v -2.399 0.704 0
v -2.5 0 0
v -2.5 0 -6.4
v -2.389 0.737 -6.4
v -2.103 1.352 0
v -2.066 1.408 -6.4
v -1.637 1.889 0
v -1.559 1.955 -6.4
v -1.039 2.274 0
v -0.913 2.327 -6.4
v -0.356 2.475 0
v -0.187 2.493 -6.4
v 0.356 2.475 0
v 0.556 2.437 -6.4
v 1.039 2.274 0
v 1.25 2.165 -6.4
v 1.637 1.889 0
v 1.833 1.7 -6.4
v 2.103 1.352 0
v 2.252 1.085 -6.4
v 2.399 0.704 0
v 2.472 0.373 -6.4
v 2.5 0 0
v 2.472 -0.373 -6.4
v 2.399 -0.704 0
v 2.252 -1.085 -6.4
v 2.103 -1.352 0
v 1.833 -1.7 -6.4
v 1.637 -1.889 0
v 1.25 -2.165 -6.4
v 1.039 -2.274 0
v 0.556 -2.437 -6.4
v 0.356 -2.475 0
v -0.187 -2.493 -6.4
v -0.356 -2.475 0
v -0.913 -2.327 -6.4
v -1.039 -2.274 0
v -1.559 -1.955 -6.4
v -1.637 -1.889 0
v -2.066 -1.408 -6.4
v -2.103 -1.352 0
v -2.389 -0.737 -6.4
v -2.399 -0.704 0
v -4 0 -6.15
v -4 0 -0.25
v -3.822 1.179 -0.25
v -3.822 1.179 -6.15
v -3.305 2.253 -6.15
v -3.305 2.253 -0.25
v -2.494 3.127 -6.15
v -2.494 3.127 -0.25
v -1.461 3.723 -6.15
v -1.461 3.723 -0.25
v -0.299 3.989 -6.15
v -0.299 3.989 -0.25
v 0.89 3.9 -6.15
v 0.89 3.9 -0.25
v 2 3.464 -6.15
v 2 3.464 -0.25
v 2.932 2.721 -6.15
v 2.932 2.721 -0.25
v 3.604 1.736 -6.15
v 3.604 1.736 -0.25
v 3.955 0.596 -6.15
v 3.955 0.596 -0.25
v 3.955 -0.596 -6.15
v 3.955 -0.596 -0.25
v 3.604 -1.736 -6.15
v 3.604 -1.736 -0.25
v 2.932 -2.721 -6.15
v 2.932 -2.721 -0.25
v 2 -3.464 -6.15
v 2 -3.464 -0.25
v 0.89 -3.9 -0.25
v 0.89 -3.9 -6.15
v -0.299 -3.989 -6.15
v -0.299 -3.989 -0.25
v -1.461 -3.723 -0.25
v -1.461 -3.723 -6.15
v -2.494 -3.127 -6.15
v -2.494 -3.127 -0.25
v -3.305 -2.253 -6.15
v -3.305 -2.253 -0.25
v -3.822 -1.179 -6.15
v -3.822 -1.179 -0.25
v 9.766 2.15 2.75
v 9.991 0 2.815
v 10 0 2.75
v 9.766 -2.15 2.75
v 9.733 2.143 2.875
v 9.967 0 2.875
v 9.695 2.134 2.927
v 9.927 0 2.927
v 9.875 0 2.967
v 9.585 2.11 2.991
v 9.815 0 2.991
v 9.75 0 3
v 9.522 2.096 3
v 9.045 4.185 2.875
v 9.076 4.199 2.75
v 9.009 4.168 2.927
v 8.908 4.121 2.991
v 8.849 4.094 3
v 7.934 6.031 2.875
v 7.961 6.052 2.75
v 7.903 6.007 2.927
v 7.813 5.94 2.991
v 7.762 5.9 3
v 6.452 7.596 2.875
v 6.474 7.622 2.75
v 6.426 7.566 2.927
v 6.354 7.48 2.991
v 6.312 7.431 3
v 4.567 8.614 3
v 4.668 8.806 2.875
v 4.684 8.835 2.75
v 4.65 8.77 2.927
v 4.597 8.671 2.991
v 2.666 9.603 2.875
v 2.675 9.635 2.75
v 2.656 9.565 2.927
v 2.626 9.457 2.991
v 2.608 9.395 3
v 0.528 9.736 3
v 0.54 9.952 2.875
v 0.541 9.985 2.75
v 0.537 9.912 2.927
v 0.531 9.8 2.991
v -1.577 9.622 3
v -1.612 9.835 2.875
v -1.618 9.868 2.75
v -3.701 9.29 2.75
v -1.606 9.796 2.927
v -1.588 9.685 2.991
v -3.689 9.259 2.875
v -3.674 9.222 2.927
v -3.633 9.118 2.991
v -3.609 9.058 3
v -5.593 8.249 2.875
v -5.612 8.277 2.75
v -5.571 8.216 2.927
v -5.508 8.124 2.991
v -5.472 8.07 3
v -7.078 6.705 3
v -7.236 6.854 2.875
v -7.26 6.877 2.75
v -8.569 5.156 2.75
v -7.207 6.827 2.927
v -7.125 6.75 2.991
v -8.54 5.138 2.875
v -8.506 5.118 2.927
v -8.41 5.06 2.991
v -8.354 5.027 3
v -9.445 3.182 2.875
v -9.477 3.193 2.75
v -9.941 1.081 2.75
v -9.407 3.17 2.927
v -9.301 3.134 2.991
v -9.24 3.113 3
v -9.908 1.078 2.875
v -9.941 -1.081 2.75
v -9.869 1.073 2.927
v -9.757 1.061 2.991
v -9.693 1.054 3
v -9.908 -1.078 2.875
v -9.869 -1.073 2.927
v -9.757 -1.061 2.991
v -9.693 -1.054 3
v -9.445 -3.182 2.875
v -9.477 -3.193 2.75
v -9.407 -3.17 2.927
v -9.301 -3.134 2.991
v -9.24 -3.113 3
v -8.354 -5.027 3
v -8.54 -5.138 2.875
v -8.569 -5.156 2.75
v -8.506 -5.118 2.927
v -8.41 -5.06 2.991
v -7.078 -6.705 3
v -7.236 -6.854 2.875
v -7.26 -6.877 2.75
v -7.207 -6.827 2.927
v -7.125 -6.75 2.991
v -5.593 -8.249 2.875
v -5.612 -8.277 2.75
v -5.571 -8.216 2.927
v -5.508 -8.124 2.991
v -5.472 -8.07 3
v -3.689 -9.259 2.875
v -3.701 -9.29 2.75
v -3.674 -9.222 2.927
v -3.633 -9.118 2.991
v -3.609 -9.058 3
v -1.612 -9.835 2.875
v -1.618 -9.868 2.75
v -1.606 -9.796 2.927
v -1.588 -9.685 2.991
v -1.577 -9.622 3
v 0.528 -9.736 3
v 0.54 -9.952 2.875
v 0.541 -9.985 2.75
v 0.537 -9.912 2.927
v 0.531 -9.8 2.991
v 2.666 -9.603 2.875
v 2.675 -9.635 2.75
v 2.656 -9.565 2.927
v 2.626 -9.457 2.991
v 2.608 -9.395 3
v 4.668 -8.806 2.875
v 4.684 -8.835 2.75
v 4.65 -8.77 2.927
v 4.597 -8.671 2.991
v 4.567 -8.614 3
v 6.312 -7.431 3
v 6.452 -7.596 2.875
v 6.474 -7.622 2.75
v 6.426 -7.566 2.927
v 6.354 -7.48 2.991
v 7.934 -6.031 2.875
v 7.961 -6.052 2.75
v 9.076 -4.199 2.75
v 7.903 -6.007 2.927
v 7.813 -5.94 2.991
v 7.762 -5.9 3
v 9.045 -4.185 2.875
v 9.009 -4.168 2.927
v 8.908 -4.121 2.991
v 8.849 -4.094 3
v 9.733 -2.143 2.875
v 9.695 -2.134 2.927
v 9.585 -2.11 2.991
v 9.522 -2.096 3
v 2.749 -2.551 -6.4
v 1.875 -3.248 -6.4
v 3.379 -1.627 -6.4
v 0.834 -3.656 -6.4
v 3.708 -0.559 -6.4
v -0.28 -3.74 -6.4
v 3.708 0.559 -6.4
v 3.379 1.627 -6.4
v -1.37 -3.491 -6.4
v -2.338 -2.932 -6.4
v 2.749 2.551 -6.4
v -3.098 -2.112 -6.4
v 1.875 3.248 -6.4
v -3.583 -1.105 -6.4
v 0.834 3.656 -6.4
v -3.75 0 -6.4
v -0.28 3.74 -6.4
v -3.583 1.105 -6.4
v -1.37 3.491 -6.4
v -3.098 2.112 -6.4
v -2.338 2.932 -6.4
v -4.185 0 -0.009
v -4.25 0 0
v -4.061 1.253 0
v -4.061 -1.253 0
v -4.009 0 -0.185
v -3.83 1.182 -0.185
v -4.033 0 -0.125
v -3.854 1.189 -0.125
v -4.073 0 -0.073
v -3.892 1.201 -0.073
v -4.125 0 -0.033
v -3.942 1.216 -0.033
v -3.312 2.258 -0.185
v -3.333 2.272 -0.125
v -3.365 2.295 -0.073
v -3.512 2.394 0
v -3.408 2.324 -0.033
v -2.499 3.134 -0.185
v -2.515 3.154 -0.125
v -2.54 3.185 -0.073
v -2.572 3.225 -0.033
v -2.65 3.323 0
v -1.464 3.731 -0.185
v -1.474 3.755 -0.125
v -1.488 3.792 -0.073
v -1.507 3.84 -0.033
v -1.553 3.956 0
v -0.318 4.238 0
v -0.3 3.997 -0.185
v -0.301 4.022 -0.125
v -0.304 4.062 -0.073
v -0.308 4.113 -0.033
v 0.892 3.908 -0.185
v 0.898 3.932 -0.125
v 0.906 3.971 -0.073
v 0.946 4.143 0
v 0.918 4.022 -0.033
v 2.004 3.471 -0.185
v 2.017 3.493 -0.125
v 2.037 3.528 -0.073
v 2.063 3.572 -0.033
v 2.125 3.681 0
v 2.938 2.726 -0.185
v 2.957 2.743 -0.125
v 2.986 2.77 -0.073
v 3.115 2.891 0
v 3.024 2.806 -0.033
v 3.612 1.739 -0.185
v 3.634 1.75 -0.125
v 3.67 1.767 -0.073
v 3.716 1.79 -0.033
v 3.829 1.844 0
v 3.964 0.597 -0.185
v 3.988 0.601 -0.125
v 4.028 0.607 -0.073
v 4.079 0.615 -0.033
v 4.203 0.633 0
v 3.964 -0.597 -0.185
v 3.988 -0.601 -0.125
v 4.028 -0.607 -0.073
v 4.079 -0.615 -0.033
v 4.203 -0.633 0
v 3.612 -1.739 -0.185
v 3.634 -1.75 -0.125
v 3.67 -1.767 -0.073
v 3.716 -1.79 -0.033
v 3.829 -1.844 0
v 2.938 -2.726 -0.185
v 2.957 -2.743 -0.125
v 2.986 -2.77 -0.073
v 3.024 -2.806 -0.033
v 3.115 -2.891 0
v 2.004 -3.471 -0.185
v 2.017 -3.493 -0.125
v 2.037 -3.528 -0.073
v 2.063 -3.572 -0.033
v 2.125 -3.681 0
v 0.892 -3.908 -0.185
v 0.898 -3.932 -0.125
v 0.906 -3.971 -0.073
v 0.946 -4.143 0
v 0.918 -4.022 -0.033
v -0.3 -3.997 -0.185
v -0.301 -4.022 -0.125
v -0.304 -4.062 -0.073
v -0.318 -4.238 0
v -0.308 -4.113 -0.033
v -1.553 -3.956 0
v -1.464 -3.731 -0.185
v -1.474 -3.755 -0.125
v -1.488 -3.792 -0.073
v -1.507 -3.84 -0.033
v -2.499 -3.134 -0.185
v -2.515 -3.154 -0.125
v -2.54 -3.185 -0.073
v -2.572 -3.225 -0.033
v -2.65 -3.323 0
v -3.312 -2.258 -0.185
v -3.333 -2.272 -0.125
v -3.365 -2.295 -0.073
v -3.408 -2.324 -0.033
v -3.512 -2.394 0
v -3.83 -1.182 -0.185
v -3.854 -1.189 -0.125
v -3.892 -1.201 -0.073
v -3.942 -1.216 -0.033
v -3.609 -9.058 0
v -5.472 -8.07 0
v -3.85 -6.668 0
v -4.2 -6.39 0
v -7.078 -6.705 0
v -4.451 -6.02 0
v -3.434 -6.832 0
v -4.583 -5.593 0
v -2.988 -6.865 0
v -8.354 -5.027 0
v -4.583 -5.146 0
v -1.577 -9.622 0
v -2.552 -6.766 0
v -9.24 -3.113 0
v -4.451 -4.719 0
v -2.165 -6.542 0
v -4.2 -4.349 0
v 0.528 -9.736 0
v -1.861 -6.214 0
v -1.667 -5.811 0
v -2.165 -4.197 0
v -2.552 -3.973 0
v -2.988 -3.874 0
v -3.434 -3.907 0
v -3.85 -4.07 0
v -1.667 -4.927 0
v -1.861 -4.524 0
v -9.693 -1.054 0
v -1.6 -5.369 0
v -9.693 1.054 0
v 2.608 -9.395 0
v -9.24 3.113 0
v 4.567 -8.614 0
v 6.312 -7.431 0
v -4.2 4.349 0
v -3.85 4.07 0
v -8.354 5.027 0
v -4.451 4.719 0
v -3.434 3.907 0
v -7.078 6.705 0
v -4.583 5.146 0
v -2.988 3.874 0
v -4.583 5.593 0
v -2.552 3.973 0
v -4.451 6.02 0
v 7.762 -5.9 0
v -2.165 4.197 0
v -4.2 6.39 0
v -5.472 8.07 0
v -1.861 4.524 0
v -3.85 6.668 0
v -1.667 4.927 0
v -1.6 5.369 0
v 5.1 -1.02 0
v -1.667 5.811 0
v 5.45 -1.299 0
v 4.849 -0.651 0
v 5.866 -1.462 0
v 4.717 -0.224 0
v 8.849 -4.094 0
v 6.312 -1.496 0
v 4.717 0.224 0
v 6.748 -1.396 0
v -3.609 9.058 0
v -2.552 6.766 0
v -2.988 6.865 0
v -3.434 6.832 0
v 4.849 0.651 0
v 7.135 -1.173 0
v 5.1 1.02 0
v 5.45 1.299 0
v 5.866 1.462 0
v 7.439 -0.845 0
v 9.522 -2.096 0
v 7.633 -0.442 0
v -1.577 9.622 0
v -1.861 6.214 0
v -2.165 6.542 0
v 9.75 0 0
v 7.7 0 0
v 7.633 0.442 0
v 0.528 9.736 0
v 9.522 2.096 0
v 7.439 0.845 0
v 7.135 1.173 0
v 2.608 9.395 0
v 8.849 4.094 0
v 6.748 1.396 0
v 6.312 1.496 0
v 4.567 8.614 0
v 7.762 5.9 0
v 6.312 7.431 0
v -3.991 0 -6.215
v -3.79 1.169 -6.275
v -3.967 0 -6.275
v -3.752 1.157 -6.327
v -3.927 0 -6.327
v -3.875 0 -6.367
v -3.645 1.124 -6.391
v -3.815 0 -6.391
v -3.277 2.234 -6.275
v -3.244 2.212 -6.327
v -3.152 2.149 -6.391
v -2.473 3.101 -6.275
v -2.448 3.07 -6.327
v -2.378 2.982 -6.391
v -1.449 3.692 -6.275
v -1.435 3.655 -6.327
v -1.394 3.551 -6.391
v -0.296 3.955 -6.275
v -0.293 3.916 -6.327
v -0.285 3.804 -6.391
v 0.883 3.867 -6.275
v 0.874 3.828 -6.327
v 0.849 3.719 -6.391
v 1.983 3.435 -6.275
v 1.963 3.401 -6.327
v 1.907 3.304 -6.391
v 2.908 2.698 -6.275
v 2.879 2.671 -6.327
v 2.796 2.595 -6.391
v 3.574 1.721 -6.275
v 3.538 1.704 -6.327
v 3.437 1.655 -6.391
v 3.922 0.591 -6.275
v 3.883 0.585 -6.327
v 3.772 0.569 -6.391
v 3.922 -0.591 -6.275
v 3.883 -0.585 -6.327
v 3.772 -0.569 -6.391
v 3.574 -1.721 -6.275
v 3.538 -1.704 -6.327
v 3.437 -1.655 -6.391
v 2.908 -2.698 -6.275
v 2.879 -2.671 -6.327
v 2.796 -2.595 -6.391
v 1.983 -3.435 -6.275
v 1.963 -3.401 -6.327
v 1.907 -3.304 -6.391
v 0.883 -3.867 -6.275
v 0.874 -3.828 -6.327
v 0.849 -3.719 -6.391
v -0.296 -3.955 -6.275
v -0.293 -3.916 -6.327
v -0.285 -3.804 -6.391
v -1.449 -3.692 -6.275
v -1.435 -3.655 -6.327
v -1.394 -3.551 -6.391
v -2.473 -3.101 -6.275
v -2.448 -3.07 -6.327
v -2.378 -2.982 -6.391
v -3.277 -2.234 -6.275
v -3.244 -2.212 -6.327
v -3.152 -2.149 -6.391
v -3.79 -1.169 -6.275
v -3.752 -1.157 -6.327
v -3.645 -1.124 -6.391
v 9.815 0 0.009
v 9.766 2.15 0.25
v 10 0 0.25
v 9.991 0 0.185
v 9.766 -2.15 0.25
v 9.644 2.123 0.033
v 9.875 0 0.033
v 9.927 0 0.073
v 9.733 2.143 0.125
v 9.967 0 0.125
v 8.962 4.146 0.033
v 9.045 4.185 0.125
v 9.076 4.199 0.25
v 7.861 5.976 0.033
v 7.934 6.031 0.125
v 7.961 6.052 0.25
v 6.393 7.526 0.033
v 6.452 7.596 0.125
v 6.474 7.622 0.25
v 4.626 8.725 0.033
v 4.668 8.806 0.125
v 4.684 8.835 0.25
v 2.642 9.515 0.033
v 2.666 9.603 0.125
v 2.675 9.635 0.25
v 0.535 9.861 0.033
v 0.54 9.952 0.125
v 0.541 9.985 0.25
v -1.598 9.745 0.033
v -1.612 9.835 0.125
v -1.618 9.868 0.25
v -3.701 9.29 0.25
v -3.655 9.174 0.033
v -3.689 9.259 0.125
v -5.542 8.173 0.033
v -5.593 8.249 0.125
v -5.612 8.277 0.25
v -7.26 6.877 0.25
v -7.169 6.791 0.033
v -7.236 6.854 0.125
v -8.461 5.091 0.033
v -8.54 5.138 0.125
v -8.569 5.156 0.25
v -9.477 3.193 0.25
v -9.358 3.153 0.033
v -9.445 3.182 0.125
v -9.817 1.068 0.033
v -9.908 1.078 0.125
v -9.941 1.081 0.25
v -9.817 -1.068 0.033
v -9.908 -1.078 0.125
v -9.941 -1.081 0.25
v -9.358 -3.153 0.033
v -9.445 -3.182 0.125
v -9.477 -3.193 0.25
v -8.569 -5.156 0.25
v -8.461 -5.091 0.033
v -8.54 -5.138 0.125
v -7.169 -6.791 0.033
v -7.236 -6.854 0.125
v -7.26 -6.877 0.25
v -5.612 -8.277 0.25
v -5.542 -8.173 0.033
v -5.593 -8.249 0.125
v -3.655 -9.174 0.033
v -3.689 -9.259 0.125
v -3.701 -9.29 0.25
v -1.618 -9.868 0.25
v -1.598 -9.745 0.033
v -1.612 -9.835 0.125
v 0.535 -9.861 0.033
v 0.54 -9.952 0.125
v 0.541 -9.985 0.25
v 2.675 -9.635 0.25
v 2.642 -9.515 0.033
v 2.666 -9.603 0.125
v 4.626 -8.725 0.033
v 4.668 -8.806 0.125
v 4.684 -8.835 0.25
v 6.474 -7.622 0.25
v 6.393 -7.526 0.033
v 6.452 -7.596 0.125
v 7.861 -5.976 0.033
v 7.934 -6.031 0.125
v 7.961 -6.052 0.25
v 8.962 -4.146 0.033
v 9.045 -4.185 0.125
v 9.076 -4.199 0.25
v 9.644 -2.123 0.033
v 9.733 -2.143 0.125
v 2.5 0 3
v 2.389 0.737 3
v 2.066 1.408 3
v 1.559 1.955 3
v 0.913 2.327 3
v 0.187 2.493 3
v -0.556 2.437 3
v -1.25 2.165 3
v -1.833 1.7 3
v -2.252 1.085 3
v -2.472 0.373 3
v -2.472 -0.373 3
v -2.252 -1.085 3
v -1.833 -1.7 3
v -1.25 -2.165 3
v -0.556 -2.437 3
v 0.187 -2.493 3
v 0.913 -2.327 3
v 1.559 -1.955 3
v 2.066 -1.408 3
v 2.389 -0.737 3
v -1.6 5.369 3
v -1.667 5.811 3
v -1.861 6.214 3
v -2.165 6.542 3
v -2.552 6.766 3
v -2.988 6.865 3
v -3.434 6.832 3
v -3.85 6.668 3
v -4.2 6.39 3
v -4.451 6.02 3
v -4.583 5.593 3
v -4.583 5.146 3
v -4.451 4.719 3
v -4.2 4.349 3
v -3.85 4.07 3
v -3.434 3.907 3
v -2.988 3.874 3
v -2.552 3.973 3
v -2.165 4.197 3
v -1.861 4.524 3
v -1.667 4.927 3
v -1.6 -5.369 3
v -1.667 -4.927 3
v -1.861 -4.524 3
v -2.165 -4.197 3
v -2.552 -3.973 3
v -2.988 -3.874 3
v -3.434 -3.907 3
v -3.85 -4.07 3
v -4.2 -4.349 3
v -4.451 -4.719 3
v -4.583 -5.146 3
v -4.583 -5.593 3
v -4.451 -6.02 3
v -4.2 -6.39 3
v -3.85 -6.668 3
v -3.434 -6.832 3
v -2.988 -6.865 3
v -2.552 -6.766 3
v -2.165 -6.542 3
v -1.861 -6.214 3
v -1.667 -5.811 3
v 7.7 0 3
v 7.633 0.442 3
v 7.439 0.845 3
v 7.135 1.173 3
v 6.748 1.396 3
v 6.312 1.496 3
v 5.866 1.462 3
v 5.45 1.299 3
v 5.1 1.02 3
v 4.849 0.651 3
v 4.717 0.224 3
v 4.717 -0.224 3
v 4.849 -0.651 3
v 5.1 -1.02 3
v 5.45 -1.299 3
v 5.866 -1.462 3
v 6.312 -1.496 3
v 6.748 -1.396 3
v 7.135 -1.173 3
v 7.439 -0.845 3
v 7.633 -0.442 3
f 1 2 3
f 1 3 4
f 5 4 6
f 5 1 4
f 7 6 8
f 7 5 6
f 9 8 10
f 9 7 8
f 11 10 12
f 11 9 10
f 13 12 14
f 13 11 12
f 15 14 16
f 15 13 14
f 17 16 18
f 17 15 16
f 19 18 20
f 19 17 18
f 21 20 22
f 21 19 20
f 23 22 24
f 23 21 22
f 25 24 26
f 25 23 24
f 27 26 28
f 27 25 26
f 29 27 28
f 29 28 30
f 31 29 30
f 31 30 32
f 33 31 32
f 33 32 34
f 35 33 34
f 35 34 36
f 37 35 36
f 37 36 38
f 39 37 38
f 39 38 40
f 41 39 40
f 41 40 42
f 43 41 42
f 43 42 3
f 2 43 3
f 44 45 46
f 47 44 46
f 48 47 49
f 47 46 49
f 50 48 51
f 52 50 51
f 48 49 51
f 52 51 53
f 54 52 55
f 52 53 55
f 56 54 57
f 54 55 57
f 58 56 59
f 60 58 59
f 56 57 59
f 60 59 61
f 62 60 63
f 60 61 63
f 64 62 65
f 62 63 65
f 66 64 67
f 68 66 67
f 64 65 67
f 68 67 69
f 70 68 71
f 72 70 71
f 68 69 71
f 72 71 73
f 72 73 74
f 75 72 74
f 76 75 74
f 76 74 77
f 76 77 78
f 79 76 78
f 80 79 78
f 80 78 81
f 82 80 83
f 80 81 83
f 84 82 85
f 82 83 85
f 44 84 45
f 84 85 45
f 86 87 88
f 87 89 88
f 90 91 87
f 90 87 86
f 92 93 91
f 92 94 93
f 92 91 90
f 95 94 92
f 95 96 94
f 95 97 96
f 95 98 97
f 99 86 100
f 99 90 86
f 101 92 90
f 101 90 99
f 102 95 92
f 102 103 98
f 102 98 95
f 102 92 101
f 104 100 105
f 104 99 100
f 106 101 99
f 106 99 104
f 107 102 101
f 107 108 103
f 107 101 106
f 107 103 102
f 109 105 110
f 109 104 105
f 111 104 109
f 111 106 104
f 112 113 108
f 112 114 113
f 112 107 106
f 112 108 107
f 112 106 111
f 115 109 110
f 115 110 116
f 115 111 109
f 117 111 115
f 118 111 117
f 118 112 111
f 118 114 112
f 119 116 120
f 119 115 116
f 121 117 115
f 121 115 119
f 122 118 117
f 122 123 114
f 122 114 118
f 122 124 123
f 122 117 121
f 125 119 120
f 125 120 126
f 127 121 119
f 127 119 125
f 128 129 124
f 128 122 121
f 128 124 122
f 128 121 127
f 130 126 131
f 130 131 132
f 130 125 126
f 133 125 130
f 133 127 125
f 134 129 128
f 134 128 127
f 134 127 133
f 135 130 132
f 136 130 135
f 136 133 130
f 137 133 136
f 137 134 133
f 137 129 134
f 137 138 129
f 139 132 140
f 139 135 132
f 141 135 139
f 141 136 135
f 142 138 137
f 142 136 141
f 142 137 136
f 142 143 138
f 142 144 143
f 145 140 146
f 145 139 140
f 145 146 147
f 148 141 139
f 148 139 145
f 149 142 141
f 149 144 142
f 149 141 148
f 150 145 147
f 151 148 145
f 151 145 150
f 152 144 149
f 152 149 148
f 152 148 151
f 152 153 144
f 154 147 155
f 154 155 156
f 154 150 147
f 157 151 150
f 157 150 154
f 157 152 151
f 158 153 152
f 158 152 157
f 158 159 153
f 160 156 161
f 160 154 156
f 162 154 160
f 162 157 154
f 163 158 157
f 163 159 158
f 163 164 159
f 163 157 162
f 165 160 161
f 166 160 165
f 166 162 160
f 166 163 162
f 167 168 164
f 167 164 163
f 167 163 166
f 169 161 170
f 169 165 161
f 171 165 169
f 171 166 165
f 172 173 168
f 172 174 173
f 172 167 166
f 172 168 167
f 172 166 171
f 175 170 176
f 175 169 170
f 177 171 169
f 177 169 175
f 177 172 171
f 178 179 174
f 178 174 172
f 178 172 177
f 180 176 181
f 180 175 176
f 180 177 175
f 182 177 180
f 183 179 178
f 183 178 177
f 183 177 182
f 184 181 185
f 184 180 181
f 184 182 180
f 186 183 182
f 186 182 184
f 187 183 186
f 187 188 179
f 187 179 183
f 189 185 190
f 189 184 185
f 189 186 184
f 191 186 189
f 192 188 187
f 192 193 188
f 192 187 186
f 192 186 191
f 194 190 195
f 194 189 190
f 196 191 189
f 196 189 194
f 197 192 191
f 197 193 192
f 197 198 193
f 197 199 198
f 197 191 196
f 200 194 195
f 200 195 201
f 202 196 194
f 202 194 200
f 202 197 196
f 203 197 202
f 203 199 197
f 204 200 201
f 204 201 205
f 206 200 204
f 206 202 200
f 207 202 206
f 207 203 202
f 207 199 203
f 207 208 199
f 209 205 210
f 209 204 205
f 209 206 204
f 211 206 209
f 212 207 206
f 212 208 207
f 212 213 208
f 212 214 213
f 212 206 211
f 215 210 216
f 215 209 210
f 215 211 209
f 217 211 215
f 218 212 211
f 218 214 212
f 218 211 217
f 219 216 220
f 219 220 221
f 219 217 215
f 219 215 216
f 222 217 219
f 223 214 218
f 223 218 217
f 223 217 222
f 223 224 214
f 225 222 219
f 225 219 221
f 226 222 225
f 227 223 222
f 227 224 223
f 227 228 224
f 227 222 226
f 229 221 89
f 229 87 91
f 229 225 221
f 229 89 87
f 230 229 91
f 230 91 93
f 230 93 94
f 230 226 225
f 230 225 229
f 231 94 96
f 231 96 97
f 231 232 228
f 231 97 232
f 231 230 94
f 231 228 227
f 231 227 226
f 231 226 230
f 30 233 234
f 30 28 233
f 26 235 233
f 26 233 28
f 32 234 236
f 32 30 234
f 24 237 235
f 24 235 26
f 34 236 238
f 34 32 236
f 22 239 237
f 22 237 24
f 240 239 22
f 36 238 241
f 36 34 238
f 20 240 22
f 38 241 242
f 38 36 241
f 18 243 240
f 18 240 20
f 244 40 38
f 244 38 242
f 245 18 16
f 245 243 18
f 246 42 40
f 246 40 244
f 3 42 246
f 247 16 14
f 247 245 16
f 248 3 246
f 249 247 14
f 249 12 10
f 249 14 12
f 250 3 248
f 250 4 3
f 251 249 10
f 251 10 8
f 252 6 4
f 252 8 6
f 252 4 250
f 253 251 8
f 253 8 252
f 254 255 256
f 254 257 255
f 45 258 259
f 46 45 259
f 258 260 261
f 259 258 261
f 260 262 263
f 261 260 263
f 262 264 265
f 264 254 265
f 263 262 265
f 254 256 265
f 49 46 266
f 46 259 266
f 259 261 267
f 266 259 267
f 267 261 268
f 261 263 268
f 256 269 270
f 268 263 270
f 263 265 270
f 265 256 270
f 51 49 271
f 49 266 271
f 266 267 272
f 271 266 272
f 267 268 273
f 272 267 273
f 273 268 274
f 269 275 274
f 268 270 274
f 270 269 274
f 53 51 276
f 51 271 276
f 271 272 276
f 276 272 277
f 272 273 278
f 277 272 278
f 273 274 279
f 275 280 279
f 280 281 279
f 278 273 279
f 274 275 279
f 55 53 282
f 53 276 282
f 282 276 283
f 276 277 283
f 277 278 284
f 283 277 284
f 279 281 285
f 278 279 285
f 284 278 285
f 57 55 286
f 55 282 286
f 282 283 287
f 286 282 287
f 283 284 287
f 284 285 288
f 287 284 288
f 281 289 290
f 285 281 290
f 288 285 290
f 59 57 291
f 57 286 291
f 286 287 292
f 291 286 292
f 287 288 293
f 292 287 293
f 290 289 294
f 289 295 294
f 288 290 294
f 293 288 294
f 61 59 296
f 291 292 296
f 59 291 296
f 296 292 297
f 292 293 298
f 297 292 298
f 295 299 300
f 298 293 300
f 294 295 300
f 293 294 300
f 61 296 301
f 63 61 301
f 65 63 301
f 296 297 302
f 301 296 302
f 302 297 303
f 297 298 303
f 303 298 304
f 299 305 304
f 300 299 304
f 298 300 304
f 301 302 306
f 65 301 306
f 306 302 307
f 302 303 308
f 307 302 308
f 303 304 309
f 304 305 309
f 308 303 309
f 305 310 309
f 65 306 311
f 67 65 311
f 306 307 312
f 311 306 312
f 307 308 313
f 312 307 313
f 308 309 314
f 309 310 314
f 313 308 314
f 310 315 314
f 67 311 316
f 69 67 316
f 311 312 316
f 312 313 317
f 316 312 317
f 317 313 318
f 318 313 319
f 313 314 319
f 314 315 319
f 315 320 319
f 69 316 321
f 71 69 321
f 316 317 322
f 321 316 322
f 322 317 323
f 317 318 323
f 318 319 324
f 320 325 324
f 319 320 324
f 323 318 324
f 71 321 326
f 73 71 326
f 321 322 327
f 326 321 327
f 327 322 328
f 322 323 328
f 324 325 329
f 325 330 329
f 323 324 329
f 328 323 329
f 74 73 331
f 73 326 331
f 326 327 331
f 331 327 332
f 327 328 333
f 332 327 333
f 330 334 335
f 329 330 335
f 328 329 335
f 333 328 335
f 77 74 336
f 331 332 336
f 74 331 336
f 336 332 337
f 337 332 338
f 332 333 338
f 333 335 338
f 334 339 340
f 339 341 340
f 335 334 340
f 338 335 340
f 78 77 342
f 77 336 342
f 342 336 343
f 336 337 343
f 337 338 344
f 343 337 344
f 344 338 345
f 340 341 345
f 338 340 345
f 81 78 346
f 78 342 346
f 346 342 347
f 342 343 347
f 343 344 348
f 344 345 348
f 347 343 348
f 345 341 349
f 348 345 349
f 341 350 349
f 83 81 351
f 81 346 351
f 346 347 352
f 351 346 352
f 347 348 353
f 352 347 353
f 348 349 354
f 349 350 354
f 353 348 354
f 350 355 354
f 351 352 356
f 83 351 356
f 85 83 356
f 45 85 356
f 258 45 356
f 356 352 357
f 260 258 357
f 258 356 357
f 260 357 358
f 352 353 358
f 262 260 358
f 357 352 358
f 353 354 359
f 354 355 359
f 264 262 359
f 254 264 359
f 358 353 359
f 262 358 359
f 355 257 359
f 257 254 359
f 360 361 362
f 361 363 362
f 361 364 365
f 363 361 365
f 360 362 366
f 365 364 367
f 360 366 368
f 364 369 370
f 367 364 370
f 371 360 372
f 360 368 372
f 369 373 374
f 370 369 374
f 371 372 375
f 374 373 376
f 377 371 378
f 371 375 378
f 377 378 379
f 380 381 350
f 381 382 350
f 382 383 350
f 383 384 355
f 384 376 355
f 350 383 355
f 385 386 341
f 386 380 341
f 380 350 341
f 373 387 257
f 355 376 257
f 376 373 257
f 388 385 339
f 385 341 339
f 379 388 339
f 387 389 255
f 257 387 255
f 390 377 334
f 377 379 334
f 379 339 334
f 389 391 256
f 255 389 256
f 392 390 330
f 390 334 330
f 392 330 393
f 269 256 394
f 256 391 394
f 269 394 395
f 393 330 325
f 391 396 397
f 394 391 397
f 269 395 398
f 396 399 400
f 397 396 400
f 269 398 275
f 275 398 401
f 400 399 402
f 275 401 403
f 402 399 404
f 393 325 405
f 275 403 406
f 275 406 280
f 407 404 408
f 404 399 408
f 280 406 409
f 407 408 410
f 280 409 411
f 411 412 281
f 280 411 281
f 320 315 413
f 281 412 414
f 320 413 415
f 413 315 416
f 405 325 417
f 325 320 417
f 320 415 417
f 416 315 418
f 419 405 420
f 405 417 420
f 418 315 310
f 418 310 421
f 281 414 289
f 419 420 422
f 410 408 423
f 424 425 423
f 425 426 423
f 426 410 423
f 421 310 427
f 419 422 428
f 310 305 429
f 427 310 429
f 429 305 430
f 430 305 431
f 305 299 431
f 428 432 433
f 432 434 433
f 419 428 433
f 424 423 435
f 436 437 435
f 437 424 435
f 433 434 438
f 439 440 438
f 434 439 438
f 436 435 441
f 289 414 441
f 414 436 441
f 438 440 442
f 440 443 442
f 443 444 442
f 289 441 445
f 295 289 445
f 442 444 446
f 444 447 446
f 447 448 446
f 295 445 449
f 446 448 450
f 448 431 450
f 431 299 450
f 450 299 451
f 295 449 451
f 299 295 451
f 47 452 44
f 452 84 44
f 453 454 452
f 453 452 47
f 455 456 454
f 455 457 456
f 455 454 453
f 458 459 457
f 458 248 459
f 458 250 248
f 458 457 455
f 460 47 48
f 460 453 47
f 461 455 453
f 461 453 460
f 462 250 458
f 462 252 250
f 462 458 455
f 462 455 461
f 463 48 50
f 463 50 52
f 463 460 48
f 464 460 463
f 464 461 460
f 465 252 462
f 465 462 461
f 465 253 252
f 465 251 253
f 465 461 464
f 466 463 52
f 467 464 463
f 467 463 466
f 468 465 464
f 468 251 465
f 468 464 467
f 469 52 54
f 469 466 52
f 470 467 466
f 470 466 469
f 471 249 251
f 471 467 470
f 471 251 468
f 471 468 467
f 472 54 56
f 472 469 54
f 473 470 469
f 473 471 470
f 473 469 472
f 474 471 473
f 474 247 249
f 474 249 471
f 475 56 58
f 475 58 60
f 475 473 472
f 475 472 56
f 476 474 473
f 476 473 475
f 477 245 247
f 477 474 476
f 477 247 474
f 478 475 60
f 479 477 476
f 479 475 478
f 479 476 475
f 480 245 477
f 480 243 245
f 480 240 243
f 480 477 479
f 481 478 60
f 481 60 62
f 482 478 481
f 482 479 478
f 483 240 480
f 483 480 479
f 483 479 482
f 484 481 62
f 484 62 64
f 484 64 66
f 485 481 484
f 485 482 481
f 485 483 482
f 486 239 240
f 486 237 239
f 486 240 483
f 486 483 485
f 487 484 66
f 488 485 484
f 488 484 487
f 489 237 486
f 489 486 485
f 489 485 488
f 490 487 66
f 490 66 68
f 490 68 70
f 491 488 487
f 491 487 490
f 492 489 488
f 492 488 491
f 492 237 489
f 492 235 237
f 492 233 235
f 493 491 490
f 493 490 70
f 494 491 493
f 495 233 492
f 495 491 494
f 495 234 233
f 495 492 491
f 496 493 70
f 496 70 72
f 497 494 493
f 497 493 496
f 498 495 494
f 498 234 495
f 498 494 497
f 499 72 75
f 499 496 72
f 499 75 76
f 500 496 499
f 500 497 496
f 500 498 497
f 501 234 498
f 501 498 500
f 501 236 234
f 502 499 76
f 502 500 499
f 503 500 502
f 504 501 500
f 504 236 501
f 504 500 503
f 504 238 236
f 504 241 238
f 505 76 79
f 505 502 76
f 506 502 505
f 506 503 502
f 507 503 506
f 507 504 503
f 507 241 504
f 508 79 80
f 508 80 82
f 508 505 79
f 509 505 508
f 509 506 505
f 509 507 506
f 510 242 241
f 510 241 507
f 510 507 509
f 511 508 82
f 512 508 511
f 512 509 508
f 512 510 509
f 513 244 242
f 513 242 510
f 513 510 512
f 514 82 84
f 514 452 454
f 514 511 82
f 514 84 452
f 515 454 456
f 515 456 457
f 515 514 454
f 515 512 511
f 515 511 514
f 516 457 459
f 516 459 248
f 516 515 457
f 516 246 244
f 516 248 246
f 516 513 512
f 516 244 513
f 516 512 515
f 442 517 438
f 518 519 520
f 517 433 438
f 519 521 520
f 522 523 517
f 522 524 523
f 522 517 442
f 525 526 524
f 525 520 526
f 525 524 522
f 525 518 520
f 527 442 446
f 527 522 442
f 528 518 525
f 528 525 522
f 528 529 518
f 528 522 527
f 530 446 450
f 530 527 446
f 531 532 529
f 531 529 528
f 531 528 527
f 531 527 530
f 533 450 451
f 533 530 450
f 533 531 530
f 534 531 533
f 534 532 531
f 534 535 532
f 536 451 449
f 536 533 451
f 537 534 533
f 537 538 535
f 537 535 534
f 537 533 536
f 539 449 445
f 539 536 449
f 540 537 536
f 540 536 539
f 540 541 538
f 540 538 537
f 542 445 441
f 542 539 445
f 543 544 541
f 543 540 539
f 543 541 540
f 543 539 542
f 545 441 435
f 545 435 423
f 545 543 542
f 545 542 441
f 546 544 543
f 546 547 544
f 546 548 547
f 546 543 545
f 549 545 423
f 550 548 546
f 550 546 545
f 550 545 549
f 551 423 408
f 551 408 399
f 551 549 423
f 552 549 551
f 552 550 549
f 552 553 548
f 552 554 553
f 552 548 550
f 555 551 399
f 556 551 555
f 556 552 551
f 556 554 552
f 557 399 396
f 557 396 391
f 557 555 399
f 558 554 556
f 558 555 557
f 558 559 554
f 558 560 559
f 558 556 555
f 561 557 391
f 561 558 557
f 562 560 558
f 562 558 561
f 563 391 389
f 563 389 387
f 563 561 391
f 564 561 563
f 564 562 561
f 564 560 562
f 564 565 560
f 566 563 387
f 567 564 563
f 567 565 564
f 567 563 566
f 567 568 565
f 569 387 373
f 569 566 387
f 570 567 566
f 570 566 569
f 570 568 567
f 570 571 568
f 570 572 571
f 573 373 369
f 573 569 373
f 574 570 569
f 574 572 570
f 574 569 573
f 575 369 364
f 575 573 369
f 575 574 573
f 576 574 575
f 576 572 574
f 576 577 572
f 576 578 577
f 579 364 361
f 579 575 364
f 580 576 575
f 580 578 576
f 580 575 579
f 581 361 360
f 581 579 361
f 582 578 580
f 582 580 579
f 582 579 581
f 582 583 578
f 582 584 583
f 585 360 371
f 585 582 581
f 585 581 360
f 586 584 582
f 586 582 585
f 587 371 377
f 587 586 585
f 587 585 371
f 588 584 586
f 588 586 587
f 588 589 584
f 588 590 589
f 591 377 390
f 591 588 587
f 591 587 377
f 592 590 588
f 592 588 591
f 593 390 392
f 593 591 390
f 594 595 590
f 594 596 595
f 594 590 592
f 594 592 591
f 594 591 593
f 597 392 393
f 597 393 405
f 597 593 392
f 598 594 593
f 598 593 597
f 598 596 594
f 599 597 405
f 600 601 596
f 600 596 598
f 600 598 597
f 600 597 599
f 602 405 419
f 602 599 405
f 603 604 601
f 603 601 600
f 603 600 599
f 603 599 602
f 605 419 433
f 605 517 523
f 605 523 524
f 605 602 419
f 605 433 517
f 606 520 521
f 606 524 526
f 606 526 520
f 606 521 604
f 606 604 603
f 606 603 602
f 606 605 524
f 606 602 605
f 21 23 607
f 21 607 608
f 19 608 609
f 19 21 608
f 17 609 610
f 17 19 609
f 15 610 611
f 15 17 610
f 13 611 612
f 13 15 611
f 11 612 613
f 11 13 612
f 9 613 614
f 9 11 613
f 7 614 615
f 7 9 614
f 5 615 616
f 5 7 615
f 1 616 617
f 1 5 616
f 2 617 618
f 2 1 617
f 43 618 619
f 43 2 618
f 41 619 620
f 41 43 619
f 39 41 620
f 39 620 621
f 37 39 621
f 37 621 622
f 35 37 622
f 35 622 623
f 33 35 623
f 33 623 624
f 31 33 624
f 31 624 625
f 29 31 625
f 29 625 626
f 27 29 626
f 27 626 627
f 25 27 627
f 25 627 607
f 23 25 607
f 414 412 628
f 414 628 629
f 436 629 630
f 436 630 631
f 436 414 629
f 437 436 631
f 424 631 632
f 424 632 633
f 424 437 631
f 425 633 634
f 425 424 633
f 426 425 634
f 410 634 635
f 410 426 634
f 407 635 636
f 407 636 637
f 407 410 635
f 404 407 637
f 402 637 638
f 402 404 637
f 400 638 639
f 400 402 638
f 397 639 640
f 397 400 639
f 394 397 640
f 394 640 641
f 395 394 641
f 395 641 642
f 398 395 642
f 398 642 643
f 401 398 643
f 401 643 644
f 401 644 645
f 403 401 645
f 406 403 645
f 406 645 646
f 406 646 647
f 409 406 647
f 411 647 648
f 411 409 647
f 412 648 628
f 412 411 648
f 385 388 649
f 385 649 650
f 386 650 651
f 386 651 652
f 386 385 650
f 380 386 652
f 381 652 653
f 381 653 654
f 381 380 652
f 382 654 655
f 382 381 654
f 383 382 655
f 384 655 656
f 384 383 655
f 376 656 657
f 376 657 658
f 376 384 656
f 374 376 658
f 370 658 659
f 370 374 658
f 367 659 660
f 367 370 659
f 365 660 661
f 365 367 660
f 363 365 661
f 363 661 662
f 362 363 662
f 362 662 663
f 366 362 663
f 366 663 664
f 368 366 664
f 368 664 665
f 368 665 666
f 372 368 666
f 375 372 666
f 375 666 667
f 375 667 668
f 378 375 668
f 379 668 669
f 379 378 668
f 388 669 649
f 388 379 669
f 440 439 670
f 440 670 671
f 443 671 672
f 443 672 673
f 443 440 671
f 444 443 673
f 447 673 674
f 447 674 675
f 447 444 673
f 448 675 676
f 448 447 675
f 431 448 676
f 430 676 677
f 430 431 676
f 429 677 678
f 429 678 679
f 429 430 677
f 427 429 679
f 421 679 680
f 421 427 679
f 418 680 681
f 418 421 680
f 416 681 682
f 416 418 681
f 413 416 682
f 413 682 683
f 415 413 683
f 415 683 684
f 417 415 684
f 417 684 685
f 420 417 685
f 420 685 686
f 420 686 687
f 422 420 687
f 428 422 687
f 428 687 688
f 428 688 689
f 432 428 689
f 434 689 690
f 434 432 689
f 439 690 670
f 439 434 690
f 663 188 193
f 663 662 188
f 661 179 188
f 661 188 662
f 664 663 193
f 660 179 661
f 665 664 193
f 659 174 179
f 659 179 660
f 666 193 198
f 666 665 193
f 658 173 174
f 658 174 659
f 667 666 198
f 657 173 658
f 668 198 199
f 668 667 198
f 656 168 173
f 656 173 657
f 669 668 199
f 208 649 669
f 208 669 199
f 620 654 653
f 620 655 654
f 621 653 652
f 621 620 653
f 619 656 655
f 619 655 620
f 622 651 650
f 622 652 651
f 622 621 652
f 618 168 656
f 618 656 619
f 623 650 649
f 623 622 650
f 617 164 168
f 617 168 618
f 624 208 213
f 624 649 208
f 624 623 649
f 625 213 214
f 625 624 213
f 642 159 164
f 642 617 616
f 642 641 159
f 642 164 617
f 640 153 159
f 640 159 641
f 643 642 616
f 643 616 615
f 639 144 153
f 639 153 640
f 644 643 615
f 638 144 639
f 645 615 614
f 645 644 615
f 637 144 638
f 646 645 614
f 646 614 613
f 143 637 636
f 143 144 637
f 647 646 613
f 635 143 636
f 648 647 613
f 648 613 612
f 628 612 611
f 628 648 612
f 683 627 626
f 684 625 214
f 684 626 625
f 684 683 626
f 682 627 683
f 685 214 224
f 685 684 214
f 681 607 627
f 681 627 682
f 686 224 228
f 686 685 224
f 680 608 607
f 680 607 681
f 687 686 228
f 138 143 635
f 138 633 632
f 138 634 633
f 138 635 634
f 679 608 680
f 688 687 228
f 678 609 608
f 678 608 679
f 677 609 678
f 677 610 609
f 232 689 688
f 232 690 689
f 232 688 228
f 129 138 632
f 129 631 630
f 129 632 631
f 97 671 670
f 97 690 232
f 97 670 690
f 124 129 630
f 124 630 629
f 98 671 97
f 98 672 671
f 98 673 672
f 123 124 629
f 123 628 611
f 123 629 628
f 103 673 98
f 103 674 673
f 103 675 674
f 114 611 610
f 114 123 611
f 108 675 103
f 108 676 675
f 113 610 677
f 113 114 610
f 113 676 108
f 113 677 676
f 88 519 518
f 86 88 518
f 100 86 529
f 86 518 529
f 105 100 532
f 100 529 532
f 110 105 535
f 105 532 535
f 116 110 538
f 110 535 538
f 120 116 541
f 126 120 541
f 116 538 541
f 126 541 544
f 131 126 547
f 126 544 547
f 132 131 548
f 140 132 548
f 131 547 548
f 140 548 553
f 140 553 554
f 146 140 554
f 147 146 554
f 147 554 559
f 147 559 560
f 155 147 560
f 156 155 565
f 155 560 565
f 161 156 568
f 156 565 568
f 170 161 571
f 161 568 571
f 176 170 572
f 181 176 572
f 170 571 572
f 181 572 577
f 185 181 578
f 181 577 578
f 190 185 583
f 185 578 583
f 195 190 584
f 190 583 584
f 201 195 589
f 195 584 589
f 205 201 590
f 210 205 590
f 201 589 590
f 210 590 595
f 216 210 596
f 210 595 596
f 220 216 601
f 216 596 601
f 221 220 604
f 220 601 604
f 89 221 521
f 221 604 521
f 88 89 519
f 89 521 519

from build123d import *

# Parameters (mm, degrees)
SKETCH1_R           = 10
SKETCH1_R_2         = 2.5
SKETCH1_R_3         = 1.5
BOSS_EXTRUDE1_DEPTH = 3
SKETCH2_R           = 4
SKETCH2_R_2         = 2.5
BOSS_EXTRUDE2_DEPTH = 6.4
FILLET1_R           = 0.25
FILLET2_R           = 0.25
FILLET3_R           = 0.25


with BuildPart() as part:
    # Sketch1 → Boss-Extrude1 (new body)
    with BuildSketch(Plane.XY):
        Circle(SKETCH1_R)
        Circle(SKETCH1_R_2, mode=Mode.SUBTRACT)
        with Locations((6.2, 0)):
            Circle(SKETCH1_R_3, mode=Mode.SUBTRACT)
        with Locations((-3.1, -5.369357503)):
            Circle(SKETCH1_R_3, mode=Mode.SUBTRACT)
        with Locations((-3.1, 5.369357503)):
            Circle(SKETCH1_R_3, mode=Mode.SUBTRACT)
    extrude(amount=BOSS_EXTRUDE1_DEPTH)

    # Sketch2 → Boss-Extrude2 (add)
    with BuildSketch(Plane(origin=(0, 0, 0), x_dir=(-1, 0, 0), z_dir=(0, 0, -1))):
        Circle(SKETCH2_R)
        Circle(SKETCH2_R_2, mode=Mode.SUBTRACT)
    extrude(amount=BOSS_EXTRUDE2_DEPTH)

    # Fillet1
    fillet1_edges = [part.edges().sort_by_distance(p)[0] for p in [
        (4, 0, 0),
    ]]
    fillet(fillet1_edges, radius=FILLET1_R)

    # Fillet2
    fillet2_edges = [part.edges().sort_by_distance(p)[0] for p in [
        (4, 0, -6.4),
    ]]
    fillet(fillet2_edges, radius=FILLET2_R)

    # Fillet3
    fillet3_edges = [part.edges().sort_by_distance(p)[0] for p in [
        (-10, 0, 0),
        (-10, 0, 3),
    ]]
    fillet(fillet3_edges, radius=FILLET3_R)


solid = part.part
